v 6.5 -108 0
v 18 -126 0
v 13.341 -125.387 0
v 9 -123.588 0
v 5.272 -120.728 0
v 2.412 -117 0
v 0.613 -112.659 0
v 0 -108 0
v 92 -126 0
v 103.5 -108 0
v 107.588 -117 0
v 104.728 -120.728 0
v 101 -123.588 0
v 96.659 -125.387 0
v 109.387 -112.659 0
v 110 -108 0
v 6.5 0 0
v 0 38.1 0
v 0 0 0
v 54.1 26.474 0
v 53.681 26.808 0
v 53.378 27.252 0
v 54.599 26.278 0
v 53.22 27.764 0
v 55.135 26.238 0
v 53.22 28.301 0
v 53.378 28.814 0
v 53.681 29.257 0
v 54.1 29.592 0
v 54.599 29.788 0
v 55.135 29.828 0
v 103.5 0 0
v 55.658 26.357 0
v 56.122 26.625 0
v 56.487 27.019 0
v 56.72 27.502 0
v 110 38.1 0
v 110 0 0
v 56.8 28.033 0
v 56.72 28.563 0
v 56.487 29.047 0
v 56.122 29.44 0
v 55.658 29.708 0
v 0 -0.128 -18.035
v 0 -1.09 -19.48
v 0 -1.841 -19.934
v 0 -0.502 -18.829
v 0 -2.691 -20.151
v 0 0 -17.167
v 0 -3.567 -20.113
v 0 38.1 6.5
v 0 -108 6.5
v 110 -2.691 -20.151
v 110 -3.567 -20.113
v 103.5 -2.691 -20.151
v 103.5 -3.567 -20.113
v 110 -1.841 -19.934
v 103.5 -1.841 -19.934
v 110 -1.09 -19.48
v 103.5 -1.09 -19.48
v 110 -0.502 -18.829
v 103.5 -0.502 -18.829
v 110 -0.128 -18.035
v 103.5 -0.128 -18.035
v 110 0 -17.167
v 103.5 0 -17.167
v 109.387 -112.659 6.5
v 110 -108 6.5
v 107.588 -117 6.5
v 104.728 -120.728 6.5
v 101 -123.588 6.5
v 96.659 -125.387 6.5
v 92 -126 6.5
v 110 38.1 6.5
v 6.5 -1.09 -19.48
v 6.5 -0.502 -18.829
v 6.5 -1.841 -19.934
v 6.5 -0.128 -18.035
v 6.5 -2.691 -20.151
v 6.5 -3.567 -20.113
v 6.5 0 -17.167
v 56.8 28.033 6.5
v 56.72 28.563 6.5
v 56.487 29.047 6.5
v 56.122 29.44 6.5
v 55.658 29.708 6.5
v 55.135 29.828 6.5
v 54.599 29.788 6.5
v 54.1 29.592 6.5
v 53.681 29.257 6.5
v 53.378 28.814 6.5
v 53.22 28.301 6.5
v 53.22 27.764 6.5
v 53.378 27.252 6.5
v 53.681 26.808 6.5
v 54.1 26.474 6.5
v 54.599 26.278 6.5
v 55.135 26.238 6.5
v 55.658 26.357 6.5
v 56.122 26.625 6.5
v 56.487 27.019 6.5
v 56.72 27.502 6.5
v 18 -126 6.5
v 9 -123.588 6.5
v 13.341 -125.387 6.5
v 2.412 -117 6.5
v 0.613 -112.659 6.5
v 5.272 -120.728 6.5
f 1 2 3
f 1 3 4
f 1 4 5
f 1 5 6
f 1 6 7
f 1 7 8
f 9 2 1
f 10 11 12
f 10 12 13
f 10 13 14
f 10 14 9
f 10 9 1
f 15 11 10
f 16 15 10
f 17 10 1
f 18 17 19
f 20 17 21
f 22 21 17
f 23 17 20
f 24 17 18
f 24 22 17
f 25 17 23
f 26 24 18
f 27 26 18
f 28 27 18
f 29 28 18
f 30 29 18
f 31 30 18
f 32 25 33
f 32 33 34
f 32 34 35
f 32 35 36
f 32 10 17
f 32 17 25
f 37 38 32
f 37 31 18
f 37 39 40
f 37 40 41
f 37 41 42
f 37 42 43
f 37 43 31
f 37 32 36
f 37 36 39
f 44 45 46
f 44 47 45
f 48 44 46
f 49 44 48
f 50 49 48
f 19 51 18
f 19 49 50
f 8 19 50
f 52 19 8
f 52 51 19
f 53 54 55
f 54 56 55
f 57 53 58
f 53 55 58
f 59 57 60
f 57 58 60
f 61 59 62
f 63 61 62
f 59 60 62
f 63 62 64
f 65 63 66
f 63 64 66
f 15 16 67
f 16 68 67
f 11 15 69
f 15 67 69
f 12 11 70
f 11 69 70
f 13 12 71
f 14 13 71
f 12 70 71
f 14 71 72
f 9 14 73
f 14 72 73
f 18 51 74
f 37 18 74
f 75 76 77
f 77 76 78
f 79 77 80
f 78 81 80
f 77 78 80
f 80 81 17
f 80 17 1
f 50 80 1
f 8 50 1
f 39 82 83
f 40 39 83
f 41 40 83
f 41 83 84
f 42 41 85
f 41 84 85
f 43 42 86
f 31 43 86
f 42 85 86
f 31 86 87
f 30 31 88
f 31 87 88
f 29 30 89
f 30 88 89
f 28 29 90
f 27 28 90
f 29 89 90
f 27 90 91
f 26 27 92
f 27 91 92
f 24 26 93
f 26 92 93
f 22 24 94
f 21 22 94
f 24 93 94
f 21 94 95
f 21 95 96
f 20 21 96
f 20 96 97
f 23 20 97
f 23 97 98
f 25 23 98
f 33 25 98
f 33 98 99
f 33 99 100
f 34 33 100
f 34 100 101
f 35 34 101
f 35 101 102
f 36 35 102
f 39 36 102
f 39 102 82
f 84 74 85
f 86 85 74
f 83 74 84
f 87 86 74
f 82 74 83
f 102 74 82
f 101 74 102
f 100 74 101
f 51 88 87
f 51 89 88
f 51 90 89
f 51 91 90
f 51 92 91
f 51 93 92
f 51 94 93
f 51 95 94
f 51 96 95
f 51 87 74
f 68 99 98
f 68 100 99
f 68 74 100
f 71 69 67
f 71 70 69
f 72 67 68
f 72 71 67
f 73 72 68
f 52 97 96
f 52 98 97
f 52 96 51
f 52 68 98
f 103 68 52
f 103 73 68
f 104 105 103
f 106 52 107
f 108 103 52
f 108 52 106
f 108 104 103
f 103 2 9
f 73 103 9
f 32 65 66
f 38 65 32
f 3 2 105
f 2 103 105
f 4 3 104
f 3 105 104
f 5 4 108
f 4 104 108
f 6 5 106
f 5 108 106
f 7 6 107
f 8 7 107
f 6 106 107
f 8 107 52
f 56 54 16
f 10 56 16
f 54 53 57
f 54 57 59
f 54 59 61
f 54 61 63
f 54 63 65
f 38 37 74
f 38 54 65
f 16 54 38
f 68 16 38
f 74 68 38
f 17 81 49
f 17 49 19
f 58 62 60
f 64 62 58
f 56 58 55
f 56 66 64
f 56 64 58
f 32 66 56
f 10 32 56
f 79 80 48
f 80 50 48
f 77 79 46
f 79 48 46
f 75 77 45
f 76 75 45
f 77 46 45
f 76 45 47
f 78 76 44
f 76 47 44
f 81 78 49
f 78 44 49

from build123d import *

# Parameters (mm, degrees)
F0_W      = 110
F0_H      = 126
F1_DEPTH  = 6.5
F2_W      = 110
F2_H      = 6.5
F3_DEPTH  = 38.1
F4_R      = 1.8
F5_DEPTH  = 14.3
F6_R      = 18
F7_R      = 18
F8_W      = 6.5
F8_H      = 146.1
F9_DEPTH  = 20.8
F10_W     = 38.1
F10_H     = 20.8
F11_DEPTH = 133.7
F13_R     = 3


# Not quite as in the source:
# - a feature of the source that left no trace in its solid (it failed there, or was rolled back) is left out


with BuildPart() as f1:
    # F0 (on Top) → F1 (new body)
    with BuildSketch(Plane.XY):
        with Locations((55, -63)):
            Rectangle(F0_W, F0_H)
    extrude(amount=F1_DEPTH)

    # F2 (on face) → F3 (join)
    with BuildSketch(Plane(origin=(0, 0, 0), x_dir=(-1, 0, 0), z_dir=(0, 1, 0))):
        with Locations((-55, 3.25)):
            Rectangle(F2_W, F2_H)
    extrude(amount=F3_DEPTH)

    # F4 (on face) → F5 (cut)
    with BuildSketch(Plane.XY.offset(6.5)):
        with Locations((55, 28.0327554792)):
            Circle(F4_R)
    extrude(amount=-F5_DEPTH, mode=Mode.SUBTRACT)

    # F6
    f6_edges = [f1.edges().sort_by_distance(p)[0] for p in [
        (110, -126, 3.25),
    ]]
    fillet(f6_edges, radius=F6_R)

    # F7
    f7_edges = [f1.edges().sort_by_distance(p)[0] for p in [
        (0, -126, 3.25),
    ]]
    fillet(f7_edges, radius=F7_R)

    # F8 (on face) → F9 (join)
    with BuildSketch(Plane(origin=(0, 0, 0), x_dir=(1, 0, 0), z_dir=(0, 0, -1))):
        with Locations((3.25, 34.95)):
            Rectangle(F8_W, F8_H)
        with Locations((106.75, 34.95)):
            Rectangle(F8_W, F8_H)
    extrude(amount=F9_DEPTH)

    # F10 (on face) → F11 (cut)
    with BuildSketch(Plane.YZ.offset(110)):
        with Locations((19.05, -10.4)):
            Rectangle(F10_W, F10_H)
        Polygon((0, -20.8), (-108, 0), (-108, -20.8), align=None)
    extrude(amount=-F11_DEPTH, mode=Mode.SUBTRACT)

    # F13
    f13_edges = [f1.edges().sort_by_distance(p)[0] for p in [
        (106.75, 0, -20.8),
        (3.25, 0, -20.8),
    ]]
    fillet(f13_edges, radius=F13_R)


solid = f1.part
